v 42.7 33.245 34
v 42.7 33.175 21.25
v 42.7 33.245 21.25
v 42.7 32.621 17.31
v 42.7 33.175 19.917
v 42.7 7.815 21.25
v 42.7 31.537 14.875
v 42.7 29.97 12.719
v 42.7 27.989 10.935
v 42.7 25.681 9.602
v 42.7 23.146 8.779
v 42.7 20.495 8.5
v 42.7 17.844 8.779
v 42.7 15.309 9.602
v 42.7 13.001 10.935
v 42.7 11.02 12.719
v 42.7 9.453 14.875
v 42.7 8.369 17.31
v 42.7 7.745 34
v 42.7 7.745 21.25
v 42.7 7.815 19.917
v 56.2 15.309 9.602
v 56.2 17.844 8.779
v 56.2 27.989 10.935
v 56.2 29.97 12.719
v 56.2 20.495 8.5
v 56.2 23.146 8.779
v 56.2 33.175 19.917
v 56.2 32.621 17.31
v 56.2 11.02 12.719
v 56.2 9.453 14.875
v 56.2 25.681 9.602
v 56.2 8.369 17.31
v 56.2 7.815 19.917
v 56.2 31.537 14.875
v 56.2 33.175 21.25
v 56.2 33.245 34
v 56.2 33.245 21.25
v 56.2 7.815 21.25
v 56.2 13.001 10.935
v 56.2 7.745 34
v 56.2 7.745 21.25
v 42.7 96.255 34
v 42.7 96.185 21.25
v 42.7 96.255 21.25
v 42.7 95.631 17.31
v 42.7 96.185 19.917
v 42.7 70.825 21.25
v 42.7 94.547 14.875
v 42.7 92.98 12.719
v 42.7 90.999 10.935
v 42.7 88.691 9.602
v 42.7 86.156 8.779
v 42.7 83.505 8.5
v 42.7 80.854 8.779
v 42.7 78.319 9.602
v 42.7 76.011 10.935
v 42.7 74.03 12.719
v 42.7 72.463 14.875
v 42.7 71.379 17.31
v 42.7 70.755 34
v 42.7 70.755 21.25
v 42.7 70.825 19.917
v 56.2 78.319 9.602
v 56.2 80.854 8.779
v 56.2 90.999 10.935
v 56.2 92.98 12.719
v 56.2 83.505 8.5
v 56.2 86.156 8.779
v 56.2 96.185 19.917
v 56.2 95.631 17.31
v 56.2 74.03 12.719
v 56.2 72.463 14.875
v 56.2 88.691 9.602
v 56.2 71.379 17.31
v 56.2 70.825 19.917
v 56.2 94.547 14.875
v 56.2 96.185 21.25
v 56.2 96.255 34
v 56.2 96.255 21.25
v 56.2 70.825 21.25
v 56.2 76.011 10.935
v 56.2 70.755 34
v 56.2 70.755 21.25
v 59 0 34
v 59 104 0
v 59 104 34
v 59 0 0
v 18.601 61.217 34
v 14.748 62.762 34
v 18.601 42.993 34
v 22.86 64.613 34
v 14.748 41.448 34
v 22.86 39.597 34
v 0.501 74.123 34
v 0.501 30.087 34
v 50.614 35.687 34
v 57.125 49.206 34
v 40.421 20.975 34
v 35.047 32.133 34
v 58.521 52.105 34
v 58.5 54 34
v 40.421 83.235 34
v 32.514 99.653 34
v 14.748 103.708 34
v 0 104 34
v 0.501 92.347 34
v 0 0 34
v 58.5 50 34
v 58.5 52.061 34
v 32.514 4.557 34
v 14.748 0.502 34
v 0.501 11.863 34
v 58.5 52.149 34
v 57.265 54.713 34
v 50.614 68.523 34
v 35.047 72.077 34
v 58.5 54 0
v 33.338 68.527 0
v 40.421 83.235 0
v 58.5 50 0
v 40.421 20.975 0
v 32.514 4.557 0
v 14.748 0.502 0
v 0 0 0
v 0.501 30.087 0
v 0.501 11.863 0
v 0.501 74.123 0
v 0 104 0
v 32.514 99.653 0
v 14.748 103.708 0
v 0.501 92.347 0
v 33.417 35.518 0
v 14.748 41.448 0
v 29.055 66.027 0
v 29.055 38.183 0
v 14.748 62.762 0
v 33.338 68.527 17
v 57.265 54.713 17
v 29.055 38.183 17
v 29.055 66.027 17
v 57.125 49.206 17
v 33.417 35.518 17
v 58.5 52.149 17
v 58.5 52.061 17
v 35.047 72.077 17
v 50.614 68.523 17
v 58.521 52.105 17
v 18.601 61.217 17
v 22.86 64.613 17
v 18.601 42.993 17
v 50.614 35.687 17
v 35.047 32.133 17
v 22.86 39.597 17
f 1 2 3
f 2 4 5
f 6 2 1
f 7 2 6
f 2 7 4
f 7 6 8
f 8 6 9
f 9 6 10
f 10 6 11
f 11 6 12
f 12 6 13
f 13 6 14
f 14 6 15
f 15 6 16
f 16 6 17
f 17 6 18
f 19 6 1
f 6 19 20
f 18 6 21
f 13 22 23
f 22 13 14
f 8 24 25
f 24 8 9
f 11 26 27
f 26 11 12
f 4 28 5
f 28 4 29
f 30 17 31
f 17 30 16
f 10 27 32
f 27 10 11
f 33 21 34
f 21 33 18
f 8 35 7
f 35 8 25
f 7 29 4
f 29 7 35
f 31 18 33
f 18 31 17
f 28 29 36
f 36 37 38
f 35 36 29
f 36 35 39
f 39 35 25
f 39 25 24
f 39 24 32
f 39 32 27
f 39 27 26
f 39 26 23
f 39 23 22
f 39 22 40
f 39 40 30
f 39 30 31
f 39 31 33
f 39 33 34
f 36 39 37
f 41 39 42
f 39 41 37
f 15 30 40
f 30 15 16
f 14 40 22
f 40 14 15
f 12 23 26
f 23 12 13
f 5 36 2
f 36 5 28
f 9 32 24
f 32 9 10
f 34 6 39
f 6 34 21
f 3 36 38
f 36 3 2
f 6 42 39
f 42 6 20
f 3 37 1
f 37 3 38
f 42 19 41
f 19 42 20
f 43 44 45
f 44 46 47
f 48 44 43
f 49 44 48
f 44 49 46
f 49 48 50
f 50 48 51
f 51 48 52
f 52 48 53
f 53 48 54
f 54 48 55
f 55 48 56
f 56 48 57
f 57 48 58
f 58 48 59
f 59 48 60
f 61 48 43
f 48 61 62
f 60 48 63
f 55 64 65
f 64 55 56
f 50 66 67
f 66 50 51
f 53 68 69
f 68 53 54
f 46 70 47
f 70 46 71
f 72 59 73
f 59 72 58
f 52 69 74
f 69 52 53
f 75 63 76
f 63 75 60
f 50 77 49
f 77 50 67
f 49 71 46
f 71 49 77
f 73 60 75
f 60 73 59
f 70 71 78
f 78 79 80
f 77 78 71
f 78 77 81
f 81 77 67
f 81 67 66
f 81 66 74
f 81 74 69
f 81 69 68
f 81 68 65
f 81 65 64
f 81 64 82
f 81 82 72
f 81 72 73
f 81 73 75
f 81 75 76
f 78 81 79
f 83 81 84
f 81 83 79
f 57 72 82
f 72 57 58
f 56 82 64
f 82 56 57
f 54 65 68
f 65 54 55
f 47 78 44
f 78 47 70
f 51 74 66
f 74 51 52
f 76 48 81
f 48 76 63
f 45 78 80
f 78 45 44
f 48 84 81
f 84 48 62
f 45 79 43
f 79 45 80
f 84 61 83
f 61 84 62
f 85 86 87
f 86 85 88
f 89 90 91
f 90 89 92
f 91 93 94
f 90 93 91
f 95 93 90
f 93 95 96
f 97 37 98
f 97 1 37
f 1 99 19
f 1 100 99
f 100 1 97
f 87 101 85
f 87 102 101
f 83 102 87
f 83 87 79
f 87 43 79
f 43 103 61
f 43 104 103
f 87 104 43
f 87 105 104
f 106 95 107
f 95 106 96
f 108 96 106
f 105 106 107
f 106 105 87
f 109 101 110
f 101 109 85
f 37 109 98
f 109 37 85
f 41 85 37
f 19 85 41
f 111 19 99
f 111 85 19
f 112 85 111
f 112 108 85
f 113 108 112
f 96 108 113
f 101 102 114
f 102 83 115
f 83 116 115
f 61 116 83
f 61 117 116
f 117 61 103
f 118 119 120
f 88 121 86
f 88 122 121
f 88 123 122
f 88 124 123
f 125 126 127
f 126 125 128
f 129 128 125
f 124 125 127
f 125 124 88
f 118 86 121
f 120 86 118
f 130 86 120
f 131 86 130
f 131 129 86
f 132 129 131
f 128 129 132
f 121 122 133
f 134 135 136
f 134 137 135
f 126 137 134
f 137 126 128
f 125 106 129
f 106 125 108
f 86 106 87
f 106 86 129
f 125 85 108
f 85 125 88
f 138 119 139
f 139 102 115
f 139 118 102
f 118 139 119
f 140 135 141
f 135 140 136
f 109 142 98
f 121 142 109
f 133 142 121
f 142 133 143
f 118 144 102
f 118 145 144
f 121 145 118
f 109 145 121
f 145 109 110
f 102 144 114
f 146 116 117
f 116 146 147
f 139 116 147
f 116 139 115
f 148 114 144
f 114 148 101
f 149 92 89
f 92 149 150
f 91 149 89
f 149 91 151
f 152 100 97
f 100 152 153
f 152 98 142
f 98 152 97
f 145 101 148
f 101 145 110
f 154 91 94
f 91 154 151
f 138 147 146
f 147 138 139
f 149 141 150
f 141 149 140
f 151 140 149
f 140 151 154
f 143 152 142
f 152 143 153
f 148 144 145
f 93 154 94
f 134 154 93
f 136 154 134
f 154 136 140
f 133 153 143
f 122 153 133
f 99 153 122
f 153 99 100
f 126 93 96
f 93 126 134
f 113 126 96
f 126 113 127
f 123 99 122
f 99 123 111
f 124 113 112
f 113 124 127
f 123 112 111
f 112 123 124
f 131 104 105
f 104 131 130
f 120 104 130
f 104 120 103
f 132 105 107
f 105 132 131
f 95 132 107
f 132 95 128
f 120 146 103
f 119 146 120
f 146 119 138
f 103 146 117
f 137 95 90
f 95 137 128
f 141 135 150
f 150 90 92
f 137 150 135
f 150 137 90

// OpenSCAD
BOX_WIDTH = 59;
BOX_DEPTH = 104;
BOX_HEIGHT = 34;

SCORE_CHIP_HEIGHT = 2.25;
SCORE_CHIP_TRIANGLE_COUNT = 8;
SCORE_CHIP_TRIANGLE_SIDE = 38;
score_chip_triangle_side_height = (SCORE_CHIP_TRIANGLE_SIDE * sqrt(3)) / 2;
score_chip_triangle_height = SCORE_CHIP_HEIGHT * SCORE_CHIP_TRIANGLE_COUNT;
SCORE_CHIP_TRIANGLE_CORNER_SIDE = 4;
score_chip_triangle_corner_side_height = (SCORE_CHIP_TRIANGLE_CORNER_SIDE * sqrt(3)) / 2;
function triangle_offset_x(height) = height / 3;
function triangle_radius(side) = side / sqrt(3);

SCORE_CHIP_ROUND_COUNT = 6;
SCORE_CHIP_ROUND_DIAMETER = 25.5;
score_chip_round_radius = SCORE_CHIP_ROUND_DIAMETER / 2;
score_chip_round_height = SCORE_CHIP_HEIGHT * SCORE_CHIP_ROUND_COUNT;

STONE_TILE_SIDE = 21;
stone_tile_side_height = 1.9 * STONE_TILE_SIDE;
stone_tile_side_width = 1.94 * STONE_TILE_SIDE;
STONE_TILE_MAX_COUNT = 21;
STONE_TILE_HEIGHT_INDIVIDUAL = 1.70;
function stone_tile_height(count) = STONE_TILE_HEIGHT_INDIVIDUAL * count;

render_helper = 1;

module stone_tile_cutout(count) {
    offset_x = STONE_TILE_SIDE * 0.901;
    offset_y = (STONE_TILE_SIDE * 1.95) / 2;
    translate([offset_x, offset_y, 0])
    cylinder(r = STONE_TILE_SIDE, h = stone_tile_height(count) + render_helper, $fn = 7);
}

module score_chip_triangle_cutout() {
    radius = triangle_radius(SCORE_CHIP_TRIANGLE_SIDE);
    corner_radius = triangle_radius(SCORE_CHIP_TRIANGLE_CORNER_SIDE);
    height = BOX_HEIGHT + render_helper * 2;
    
    linear_extrude(height)
    polygon([
        [
            score_chip_triangle_corner_side_height,
            SCORE_CHIP_TRIANGLE_CORNER_SIDE / 2
        ],
        [
            score_chip_triangle_side_height - score_chip_triangle_corner_side_height,
            SCORE_CHIP_TRIANGLE_SIDE / 2 - SCORE_CHIP_TRIANGLE_CORNER_SIDE / 2
        ],
        [
            score_chip_triangle_side_height - score_chip_triangle_corner_side_height,
            SCORE_CHIP_TRIANGLE_SIDE / 2 + SCORE_CHIP_TRIANGLE_CORNER_SIDE / 2
        ],
        [
            score_chip_triangle_corner_side_height,
            SCORE_CHIP_TRIANGLE_SIDE - SCORE_CHIP_TRIANGLE_CORNER_SIDE / 2
        ],
        [
            0,
            SCORE_CHIP_TRIANGLE_SIDE - SCORE_CHIP_TRIANGLE_CORNER_SIDE
        ],
        [
            0,
            SCORE_CHIP_TRIANGLE_CORNER_SIDE
        ]
    ]);
}

module score_chip_round_cutout() {
    union() {
        translate([0, score_chip_round_radius, score_chip_round_radius])
        rotate([0, 90, 0])
        cylinder(h = score_chip_round_height, d = SCORE_CHIP_ROUND_DIAMETER);
        
        translate([0, 0, score_chip_round_radius])
        cube([
            score_chip_round_height,
            SCORE_CHIP_ROUND_DIAMETER,
            score_chip_round_radius + render_helper
        ]);
    }
}

module base() {
    cube([
        BOX_WIDTH,
        BOX_DEPTH,
        BOX_HEIGHT
    ]);
}

module insert() {
    difference() {
        base();
        
        translate([
            BOX_WIDTH - score_chip_triangle_side_height + score_chip_triangle_corner_side_height - .5,
            (BOX_DEPTH - SCORE_CHIP_TRIANGLE_SIDE) / 2,
            -render_helper
        ])
        score_chip_triangle_cutout();
        
        translate([
            BOX_WIDTH - stone_tile_side_height - 0.5,
            (BOX_DEPTH - stone_tile_side_width) / 2,
            BOX_HEIGHT - stone_tile_height(10)
        ])
        stone_tile_cutout(10);
        
        translate([
            0.5,
            0.5,
            -render_helper
        ])
        stone_tile_cutout(STONE_TILE_MAX_COUNT);
        
        translate([
            0.5,
            BOX_DEPTH - stone_tile_side_width - 0.5,
            -render_helper
        ])
        stone_tile_cutout(STONE_TILE_MAX_COUNT);
        
        offset_x_round_chip = BOX_WIDTH - score_chip_round_height - (BOX_WIDTH - stone_tile_side_height - score_chip_round_height) / 2;
        offset_y_round_chip_partial = (stone_tile_side_width + 0.25) / 2 - score_chip_round_radius;
        
        translate([
            offset_x_round_chip,
            offset_y_round_chip_partial,
            BOX_HEIGHT - SCORE_CHIP_ROUND_DIAMETER
        ])
        score_chip_round_cutout();
        
        translate([
            offset_x_round_chip,
            BOX_DEPTH - offset_y_round_chip_partial - SCORE_CHIP_ROUND_DIAMETER,
            BOX_HEIGHT - SCORE_CHIP_ROUND_DIAMETER
        ])
        score_chip_round_cutout();
    }
}

insert();
